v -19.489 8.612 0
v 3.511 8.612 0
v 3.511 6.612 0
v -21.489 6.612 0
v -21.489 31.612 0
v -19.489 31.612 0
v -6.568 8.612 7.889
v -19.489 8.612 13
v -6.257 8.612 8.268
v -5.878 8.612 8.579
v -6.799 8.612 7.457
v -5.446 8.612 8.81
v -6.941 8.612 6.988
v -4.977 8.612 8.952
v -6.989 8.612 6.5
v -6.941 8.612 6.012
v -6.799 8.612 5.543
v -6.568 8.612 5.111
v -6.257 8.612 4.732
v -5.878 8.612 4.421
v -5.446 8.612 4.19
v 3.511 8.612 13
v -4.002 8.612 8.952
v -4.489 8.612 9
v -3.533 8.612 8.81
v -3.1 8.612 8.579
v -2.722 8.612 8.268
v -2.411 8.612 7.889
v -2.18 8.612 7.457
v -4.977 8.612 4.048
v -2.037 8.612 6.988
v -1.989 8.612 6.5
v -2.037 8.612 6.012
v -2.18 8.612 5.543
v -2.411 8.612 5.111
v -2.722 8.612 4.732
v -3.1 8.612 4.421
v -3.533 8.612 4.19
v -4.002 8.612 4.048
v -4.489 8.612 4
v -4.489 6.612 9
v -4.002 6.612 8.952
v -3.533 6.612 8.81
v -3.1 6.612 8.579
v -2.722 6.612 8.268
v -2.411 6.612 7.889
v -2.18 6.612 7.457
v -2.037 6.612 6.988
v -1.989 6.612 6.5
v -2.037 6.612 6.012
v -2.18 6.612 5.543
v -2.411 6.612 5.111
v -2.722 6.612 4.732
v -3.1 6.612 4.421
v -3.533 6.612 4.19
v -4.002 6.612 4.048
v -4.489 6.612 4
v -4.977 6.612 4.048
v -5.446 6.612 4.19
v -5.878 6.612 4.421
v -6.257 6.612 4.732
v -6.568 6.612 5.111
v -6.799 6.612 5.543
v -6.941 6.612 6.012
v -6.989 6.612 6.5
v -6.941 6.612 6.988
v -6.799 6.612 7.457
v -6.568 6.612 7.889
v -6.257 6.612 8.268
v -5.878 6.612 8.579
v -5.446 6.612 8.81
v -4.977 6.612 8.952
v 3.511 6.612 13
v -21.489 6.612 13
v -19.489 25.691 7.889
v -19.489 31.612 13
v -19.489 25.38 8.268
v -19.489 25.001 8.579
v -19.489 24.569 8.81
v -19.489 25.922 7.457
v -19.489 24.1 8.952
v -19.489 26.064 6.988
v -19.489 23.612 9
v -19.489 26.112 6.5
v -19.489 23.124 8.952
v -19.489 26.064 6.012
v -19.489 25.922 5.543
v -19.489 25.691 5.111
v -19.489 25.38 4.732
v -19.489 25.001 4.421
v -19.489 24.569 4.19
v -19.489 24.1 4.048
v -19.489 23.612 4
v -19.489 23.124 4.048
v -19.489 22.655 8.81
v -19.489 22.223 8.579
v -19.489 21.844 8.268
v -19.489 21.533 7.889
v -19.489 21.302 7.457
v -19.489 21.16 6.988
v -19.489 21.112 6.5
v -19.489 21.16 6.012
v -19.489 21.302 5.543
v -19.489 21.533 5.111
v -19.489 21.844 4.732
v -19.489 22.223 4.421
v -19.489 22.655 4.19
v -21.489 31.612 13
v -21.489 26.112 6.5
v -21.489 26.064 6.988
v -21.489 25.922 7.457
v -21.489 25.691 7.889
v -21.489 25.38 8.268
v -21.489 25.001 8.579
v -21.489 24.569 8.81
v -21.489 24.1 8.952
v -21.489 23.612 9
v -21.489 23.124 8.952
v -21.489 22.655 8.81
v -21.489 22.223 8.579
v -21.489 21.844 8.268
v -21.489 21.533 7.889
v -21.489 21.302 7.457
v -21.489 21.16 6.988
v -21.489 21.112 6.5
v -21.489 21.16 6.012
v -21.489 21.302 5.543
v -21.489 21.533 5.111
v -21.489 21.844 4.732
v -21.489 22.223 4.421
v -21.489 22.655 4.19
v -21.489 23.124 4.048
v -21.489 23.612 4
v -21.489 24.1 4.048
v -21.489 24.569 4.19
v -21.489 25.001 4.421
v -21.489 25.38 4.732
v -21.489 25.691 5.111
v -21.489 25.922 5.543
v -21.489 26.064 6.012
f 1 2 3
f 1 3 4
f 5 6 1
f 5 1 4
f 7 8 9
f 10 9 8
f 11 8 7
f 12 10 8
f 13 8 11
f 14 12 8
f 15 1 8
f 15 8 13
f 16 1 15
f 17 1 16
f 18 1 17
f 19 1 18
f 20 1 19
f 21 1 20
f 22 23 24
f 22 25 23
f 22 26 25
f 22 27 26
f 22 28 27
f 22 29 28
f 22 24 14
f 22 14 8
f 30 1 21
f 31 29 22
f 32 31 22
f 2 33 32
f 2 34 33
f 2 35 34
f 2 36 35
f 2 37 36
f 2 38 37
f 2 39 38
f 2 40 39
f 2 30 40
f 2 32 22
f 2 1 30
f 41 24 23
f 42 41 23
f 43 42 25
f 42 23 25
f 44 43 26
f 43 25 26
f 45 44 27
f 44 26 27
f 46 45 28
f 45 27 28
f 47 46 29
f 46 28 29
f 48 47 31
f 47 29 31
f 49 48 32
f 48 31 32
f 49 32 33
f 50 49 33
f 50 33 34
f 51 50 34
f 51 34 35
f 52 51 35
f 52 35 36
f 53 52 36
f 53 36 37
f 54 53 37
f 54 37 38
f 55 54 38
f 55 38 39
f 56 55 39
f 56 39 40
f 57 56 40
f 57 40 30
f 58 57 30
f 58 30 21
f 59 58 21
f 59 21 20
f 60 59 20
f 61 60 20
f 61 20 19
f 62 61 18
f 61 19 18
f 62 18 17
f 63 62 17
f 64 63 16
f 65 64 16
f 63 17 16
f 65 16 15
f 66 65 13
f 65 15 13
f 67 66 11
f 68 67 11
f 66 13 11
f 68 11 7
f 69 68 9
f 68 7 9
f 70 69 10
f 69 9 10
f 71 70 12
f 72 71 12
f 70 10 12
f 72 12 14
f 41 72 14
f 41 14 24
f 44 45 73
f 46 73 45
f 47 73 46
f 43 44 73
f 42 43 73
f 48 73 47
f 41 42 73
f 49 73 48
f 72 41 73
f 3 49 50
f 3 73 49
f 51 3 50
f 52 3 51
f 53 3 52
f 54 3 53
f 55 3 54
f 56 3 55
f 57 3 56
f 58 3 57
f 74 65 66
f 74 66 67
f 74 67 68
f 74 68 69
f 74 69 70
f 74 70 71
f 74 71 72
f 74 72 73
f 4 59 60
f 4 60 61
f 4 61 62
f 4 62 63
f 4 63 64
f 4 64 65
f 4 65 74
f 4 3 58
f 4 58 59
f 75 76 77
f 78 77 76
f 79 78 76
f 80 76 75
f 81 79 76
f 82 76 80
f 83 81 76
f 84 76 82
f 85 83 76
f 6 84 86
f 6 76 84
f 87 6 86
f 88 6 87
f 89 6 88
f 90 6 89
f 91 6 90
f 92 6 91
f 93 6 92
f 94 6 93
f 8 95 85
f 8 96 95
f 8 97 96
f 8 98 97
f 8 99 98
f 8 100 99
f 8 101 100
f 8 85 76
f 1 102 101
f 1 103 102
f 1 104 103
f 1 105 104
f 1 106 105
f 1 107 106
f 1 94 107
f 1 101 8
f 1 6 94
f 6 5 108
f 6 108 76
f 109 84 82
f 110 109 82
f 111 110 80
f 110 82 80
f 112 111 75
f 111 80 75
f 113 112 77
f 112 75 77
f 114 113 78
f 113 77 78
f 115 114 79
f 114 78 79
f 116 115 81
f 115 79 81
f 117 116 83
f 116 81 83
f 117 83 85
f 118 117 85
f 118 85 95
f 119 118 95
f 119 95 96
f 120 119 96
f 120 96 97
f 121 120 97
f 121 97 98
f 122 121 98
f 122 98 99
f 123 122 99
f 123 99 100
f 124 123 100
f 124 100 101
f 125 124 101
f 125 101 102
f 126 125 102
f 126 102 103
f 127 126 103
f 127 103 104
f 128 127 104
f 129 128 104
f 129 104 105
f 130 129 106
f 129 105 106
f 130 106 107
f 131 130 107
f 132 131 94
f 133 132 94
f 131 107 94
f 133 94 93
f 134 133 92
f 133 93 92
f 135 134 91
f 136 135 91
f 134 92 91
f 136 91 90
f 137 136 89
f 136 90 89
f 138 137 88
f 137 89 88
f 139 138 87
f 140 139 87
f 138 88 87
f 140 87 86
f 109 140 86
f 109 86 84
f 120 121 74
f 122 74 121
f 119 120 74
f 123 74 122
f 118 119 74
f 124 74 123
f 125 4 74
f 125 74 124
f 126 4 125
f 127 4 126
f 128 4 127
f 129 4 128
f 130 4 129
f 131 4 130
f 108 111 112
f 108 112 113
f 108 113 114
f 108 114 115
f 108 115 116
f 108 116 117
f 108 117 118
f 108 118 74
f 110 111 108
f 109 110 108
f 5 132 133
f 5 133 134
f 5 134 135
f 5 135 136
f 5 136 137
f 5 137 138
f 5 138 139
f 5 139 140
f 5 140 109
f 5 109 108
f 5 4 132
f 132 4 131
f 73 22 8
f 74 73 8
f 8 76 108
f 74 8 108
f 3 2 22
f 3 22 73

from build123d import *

# Parameters (mm, degrees)
RESSALTO_EXTRUS_O1_DEPTH = 13
ESBO_O3_R                = 2.5
CORTE_EXTRUS_O1_DEPTH    = 8
ESBO_O4_R                = 2.5
CORTE_EXTRUS_O2_DEPTH    = 8


with BuildPart() as part:
    # Esboço1 → Ressalto-extrusão1 (new body)
    with BuildSketch(Plane.XY):
        Polygon((3.510692293, 8.611985446), (3.510692293, 6.611985446), (-21.489307707, 6.611985446), (-21.489307707, 31.611985446), (-19.489307707, 31.611985446), (-19.489307707, 8.611985446), align=None)
    extrude(amount=RESSALTO_EXTRUS_O1_DEPTH)

    # Esboço3 → Corte-extrusão1 (cut)
    with BuildSketch(Plane(origin=(-19.489307707, 0, 0), x_dir=(0, 0, -1), z_dir=(1, 0, 0))):
        with Locations(Location((-6.5, 23.611985446, 0), (0, 0, 90))):
            Circle(ESBO_O3_R)
    extrude(amount=-CORTE_EXTRUS_O1_DEPTH, mode=Mode.SUBTRACT)

    # Esboço4 → Corte-extrusão2 (cut)
    with BuildSketch(Plane(origin=(0, 8.611985446, 0), x_dir=(1, 0, 0), z_dir=(0, 1, 0))):
        with Locations(Location((-4.489307707, -6.5, 0), (0, 0, 270))):
            Circle(ESBO_O4_R)
    extrude(amount=-CORTE_EXTRUS_O2_DEPTH, mode=Mode.SUBTRACT)


solid = part.part
